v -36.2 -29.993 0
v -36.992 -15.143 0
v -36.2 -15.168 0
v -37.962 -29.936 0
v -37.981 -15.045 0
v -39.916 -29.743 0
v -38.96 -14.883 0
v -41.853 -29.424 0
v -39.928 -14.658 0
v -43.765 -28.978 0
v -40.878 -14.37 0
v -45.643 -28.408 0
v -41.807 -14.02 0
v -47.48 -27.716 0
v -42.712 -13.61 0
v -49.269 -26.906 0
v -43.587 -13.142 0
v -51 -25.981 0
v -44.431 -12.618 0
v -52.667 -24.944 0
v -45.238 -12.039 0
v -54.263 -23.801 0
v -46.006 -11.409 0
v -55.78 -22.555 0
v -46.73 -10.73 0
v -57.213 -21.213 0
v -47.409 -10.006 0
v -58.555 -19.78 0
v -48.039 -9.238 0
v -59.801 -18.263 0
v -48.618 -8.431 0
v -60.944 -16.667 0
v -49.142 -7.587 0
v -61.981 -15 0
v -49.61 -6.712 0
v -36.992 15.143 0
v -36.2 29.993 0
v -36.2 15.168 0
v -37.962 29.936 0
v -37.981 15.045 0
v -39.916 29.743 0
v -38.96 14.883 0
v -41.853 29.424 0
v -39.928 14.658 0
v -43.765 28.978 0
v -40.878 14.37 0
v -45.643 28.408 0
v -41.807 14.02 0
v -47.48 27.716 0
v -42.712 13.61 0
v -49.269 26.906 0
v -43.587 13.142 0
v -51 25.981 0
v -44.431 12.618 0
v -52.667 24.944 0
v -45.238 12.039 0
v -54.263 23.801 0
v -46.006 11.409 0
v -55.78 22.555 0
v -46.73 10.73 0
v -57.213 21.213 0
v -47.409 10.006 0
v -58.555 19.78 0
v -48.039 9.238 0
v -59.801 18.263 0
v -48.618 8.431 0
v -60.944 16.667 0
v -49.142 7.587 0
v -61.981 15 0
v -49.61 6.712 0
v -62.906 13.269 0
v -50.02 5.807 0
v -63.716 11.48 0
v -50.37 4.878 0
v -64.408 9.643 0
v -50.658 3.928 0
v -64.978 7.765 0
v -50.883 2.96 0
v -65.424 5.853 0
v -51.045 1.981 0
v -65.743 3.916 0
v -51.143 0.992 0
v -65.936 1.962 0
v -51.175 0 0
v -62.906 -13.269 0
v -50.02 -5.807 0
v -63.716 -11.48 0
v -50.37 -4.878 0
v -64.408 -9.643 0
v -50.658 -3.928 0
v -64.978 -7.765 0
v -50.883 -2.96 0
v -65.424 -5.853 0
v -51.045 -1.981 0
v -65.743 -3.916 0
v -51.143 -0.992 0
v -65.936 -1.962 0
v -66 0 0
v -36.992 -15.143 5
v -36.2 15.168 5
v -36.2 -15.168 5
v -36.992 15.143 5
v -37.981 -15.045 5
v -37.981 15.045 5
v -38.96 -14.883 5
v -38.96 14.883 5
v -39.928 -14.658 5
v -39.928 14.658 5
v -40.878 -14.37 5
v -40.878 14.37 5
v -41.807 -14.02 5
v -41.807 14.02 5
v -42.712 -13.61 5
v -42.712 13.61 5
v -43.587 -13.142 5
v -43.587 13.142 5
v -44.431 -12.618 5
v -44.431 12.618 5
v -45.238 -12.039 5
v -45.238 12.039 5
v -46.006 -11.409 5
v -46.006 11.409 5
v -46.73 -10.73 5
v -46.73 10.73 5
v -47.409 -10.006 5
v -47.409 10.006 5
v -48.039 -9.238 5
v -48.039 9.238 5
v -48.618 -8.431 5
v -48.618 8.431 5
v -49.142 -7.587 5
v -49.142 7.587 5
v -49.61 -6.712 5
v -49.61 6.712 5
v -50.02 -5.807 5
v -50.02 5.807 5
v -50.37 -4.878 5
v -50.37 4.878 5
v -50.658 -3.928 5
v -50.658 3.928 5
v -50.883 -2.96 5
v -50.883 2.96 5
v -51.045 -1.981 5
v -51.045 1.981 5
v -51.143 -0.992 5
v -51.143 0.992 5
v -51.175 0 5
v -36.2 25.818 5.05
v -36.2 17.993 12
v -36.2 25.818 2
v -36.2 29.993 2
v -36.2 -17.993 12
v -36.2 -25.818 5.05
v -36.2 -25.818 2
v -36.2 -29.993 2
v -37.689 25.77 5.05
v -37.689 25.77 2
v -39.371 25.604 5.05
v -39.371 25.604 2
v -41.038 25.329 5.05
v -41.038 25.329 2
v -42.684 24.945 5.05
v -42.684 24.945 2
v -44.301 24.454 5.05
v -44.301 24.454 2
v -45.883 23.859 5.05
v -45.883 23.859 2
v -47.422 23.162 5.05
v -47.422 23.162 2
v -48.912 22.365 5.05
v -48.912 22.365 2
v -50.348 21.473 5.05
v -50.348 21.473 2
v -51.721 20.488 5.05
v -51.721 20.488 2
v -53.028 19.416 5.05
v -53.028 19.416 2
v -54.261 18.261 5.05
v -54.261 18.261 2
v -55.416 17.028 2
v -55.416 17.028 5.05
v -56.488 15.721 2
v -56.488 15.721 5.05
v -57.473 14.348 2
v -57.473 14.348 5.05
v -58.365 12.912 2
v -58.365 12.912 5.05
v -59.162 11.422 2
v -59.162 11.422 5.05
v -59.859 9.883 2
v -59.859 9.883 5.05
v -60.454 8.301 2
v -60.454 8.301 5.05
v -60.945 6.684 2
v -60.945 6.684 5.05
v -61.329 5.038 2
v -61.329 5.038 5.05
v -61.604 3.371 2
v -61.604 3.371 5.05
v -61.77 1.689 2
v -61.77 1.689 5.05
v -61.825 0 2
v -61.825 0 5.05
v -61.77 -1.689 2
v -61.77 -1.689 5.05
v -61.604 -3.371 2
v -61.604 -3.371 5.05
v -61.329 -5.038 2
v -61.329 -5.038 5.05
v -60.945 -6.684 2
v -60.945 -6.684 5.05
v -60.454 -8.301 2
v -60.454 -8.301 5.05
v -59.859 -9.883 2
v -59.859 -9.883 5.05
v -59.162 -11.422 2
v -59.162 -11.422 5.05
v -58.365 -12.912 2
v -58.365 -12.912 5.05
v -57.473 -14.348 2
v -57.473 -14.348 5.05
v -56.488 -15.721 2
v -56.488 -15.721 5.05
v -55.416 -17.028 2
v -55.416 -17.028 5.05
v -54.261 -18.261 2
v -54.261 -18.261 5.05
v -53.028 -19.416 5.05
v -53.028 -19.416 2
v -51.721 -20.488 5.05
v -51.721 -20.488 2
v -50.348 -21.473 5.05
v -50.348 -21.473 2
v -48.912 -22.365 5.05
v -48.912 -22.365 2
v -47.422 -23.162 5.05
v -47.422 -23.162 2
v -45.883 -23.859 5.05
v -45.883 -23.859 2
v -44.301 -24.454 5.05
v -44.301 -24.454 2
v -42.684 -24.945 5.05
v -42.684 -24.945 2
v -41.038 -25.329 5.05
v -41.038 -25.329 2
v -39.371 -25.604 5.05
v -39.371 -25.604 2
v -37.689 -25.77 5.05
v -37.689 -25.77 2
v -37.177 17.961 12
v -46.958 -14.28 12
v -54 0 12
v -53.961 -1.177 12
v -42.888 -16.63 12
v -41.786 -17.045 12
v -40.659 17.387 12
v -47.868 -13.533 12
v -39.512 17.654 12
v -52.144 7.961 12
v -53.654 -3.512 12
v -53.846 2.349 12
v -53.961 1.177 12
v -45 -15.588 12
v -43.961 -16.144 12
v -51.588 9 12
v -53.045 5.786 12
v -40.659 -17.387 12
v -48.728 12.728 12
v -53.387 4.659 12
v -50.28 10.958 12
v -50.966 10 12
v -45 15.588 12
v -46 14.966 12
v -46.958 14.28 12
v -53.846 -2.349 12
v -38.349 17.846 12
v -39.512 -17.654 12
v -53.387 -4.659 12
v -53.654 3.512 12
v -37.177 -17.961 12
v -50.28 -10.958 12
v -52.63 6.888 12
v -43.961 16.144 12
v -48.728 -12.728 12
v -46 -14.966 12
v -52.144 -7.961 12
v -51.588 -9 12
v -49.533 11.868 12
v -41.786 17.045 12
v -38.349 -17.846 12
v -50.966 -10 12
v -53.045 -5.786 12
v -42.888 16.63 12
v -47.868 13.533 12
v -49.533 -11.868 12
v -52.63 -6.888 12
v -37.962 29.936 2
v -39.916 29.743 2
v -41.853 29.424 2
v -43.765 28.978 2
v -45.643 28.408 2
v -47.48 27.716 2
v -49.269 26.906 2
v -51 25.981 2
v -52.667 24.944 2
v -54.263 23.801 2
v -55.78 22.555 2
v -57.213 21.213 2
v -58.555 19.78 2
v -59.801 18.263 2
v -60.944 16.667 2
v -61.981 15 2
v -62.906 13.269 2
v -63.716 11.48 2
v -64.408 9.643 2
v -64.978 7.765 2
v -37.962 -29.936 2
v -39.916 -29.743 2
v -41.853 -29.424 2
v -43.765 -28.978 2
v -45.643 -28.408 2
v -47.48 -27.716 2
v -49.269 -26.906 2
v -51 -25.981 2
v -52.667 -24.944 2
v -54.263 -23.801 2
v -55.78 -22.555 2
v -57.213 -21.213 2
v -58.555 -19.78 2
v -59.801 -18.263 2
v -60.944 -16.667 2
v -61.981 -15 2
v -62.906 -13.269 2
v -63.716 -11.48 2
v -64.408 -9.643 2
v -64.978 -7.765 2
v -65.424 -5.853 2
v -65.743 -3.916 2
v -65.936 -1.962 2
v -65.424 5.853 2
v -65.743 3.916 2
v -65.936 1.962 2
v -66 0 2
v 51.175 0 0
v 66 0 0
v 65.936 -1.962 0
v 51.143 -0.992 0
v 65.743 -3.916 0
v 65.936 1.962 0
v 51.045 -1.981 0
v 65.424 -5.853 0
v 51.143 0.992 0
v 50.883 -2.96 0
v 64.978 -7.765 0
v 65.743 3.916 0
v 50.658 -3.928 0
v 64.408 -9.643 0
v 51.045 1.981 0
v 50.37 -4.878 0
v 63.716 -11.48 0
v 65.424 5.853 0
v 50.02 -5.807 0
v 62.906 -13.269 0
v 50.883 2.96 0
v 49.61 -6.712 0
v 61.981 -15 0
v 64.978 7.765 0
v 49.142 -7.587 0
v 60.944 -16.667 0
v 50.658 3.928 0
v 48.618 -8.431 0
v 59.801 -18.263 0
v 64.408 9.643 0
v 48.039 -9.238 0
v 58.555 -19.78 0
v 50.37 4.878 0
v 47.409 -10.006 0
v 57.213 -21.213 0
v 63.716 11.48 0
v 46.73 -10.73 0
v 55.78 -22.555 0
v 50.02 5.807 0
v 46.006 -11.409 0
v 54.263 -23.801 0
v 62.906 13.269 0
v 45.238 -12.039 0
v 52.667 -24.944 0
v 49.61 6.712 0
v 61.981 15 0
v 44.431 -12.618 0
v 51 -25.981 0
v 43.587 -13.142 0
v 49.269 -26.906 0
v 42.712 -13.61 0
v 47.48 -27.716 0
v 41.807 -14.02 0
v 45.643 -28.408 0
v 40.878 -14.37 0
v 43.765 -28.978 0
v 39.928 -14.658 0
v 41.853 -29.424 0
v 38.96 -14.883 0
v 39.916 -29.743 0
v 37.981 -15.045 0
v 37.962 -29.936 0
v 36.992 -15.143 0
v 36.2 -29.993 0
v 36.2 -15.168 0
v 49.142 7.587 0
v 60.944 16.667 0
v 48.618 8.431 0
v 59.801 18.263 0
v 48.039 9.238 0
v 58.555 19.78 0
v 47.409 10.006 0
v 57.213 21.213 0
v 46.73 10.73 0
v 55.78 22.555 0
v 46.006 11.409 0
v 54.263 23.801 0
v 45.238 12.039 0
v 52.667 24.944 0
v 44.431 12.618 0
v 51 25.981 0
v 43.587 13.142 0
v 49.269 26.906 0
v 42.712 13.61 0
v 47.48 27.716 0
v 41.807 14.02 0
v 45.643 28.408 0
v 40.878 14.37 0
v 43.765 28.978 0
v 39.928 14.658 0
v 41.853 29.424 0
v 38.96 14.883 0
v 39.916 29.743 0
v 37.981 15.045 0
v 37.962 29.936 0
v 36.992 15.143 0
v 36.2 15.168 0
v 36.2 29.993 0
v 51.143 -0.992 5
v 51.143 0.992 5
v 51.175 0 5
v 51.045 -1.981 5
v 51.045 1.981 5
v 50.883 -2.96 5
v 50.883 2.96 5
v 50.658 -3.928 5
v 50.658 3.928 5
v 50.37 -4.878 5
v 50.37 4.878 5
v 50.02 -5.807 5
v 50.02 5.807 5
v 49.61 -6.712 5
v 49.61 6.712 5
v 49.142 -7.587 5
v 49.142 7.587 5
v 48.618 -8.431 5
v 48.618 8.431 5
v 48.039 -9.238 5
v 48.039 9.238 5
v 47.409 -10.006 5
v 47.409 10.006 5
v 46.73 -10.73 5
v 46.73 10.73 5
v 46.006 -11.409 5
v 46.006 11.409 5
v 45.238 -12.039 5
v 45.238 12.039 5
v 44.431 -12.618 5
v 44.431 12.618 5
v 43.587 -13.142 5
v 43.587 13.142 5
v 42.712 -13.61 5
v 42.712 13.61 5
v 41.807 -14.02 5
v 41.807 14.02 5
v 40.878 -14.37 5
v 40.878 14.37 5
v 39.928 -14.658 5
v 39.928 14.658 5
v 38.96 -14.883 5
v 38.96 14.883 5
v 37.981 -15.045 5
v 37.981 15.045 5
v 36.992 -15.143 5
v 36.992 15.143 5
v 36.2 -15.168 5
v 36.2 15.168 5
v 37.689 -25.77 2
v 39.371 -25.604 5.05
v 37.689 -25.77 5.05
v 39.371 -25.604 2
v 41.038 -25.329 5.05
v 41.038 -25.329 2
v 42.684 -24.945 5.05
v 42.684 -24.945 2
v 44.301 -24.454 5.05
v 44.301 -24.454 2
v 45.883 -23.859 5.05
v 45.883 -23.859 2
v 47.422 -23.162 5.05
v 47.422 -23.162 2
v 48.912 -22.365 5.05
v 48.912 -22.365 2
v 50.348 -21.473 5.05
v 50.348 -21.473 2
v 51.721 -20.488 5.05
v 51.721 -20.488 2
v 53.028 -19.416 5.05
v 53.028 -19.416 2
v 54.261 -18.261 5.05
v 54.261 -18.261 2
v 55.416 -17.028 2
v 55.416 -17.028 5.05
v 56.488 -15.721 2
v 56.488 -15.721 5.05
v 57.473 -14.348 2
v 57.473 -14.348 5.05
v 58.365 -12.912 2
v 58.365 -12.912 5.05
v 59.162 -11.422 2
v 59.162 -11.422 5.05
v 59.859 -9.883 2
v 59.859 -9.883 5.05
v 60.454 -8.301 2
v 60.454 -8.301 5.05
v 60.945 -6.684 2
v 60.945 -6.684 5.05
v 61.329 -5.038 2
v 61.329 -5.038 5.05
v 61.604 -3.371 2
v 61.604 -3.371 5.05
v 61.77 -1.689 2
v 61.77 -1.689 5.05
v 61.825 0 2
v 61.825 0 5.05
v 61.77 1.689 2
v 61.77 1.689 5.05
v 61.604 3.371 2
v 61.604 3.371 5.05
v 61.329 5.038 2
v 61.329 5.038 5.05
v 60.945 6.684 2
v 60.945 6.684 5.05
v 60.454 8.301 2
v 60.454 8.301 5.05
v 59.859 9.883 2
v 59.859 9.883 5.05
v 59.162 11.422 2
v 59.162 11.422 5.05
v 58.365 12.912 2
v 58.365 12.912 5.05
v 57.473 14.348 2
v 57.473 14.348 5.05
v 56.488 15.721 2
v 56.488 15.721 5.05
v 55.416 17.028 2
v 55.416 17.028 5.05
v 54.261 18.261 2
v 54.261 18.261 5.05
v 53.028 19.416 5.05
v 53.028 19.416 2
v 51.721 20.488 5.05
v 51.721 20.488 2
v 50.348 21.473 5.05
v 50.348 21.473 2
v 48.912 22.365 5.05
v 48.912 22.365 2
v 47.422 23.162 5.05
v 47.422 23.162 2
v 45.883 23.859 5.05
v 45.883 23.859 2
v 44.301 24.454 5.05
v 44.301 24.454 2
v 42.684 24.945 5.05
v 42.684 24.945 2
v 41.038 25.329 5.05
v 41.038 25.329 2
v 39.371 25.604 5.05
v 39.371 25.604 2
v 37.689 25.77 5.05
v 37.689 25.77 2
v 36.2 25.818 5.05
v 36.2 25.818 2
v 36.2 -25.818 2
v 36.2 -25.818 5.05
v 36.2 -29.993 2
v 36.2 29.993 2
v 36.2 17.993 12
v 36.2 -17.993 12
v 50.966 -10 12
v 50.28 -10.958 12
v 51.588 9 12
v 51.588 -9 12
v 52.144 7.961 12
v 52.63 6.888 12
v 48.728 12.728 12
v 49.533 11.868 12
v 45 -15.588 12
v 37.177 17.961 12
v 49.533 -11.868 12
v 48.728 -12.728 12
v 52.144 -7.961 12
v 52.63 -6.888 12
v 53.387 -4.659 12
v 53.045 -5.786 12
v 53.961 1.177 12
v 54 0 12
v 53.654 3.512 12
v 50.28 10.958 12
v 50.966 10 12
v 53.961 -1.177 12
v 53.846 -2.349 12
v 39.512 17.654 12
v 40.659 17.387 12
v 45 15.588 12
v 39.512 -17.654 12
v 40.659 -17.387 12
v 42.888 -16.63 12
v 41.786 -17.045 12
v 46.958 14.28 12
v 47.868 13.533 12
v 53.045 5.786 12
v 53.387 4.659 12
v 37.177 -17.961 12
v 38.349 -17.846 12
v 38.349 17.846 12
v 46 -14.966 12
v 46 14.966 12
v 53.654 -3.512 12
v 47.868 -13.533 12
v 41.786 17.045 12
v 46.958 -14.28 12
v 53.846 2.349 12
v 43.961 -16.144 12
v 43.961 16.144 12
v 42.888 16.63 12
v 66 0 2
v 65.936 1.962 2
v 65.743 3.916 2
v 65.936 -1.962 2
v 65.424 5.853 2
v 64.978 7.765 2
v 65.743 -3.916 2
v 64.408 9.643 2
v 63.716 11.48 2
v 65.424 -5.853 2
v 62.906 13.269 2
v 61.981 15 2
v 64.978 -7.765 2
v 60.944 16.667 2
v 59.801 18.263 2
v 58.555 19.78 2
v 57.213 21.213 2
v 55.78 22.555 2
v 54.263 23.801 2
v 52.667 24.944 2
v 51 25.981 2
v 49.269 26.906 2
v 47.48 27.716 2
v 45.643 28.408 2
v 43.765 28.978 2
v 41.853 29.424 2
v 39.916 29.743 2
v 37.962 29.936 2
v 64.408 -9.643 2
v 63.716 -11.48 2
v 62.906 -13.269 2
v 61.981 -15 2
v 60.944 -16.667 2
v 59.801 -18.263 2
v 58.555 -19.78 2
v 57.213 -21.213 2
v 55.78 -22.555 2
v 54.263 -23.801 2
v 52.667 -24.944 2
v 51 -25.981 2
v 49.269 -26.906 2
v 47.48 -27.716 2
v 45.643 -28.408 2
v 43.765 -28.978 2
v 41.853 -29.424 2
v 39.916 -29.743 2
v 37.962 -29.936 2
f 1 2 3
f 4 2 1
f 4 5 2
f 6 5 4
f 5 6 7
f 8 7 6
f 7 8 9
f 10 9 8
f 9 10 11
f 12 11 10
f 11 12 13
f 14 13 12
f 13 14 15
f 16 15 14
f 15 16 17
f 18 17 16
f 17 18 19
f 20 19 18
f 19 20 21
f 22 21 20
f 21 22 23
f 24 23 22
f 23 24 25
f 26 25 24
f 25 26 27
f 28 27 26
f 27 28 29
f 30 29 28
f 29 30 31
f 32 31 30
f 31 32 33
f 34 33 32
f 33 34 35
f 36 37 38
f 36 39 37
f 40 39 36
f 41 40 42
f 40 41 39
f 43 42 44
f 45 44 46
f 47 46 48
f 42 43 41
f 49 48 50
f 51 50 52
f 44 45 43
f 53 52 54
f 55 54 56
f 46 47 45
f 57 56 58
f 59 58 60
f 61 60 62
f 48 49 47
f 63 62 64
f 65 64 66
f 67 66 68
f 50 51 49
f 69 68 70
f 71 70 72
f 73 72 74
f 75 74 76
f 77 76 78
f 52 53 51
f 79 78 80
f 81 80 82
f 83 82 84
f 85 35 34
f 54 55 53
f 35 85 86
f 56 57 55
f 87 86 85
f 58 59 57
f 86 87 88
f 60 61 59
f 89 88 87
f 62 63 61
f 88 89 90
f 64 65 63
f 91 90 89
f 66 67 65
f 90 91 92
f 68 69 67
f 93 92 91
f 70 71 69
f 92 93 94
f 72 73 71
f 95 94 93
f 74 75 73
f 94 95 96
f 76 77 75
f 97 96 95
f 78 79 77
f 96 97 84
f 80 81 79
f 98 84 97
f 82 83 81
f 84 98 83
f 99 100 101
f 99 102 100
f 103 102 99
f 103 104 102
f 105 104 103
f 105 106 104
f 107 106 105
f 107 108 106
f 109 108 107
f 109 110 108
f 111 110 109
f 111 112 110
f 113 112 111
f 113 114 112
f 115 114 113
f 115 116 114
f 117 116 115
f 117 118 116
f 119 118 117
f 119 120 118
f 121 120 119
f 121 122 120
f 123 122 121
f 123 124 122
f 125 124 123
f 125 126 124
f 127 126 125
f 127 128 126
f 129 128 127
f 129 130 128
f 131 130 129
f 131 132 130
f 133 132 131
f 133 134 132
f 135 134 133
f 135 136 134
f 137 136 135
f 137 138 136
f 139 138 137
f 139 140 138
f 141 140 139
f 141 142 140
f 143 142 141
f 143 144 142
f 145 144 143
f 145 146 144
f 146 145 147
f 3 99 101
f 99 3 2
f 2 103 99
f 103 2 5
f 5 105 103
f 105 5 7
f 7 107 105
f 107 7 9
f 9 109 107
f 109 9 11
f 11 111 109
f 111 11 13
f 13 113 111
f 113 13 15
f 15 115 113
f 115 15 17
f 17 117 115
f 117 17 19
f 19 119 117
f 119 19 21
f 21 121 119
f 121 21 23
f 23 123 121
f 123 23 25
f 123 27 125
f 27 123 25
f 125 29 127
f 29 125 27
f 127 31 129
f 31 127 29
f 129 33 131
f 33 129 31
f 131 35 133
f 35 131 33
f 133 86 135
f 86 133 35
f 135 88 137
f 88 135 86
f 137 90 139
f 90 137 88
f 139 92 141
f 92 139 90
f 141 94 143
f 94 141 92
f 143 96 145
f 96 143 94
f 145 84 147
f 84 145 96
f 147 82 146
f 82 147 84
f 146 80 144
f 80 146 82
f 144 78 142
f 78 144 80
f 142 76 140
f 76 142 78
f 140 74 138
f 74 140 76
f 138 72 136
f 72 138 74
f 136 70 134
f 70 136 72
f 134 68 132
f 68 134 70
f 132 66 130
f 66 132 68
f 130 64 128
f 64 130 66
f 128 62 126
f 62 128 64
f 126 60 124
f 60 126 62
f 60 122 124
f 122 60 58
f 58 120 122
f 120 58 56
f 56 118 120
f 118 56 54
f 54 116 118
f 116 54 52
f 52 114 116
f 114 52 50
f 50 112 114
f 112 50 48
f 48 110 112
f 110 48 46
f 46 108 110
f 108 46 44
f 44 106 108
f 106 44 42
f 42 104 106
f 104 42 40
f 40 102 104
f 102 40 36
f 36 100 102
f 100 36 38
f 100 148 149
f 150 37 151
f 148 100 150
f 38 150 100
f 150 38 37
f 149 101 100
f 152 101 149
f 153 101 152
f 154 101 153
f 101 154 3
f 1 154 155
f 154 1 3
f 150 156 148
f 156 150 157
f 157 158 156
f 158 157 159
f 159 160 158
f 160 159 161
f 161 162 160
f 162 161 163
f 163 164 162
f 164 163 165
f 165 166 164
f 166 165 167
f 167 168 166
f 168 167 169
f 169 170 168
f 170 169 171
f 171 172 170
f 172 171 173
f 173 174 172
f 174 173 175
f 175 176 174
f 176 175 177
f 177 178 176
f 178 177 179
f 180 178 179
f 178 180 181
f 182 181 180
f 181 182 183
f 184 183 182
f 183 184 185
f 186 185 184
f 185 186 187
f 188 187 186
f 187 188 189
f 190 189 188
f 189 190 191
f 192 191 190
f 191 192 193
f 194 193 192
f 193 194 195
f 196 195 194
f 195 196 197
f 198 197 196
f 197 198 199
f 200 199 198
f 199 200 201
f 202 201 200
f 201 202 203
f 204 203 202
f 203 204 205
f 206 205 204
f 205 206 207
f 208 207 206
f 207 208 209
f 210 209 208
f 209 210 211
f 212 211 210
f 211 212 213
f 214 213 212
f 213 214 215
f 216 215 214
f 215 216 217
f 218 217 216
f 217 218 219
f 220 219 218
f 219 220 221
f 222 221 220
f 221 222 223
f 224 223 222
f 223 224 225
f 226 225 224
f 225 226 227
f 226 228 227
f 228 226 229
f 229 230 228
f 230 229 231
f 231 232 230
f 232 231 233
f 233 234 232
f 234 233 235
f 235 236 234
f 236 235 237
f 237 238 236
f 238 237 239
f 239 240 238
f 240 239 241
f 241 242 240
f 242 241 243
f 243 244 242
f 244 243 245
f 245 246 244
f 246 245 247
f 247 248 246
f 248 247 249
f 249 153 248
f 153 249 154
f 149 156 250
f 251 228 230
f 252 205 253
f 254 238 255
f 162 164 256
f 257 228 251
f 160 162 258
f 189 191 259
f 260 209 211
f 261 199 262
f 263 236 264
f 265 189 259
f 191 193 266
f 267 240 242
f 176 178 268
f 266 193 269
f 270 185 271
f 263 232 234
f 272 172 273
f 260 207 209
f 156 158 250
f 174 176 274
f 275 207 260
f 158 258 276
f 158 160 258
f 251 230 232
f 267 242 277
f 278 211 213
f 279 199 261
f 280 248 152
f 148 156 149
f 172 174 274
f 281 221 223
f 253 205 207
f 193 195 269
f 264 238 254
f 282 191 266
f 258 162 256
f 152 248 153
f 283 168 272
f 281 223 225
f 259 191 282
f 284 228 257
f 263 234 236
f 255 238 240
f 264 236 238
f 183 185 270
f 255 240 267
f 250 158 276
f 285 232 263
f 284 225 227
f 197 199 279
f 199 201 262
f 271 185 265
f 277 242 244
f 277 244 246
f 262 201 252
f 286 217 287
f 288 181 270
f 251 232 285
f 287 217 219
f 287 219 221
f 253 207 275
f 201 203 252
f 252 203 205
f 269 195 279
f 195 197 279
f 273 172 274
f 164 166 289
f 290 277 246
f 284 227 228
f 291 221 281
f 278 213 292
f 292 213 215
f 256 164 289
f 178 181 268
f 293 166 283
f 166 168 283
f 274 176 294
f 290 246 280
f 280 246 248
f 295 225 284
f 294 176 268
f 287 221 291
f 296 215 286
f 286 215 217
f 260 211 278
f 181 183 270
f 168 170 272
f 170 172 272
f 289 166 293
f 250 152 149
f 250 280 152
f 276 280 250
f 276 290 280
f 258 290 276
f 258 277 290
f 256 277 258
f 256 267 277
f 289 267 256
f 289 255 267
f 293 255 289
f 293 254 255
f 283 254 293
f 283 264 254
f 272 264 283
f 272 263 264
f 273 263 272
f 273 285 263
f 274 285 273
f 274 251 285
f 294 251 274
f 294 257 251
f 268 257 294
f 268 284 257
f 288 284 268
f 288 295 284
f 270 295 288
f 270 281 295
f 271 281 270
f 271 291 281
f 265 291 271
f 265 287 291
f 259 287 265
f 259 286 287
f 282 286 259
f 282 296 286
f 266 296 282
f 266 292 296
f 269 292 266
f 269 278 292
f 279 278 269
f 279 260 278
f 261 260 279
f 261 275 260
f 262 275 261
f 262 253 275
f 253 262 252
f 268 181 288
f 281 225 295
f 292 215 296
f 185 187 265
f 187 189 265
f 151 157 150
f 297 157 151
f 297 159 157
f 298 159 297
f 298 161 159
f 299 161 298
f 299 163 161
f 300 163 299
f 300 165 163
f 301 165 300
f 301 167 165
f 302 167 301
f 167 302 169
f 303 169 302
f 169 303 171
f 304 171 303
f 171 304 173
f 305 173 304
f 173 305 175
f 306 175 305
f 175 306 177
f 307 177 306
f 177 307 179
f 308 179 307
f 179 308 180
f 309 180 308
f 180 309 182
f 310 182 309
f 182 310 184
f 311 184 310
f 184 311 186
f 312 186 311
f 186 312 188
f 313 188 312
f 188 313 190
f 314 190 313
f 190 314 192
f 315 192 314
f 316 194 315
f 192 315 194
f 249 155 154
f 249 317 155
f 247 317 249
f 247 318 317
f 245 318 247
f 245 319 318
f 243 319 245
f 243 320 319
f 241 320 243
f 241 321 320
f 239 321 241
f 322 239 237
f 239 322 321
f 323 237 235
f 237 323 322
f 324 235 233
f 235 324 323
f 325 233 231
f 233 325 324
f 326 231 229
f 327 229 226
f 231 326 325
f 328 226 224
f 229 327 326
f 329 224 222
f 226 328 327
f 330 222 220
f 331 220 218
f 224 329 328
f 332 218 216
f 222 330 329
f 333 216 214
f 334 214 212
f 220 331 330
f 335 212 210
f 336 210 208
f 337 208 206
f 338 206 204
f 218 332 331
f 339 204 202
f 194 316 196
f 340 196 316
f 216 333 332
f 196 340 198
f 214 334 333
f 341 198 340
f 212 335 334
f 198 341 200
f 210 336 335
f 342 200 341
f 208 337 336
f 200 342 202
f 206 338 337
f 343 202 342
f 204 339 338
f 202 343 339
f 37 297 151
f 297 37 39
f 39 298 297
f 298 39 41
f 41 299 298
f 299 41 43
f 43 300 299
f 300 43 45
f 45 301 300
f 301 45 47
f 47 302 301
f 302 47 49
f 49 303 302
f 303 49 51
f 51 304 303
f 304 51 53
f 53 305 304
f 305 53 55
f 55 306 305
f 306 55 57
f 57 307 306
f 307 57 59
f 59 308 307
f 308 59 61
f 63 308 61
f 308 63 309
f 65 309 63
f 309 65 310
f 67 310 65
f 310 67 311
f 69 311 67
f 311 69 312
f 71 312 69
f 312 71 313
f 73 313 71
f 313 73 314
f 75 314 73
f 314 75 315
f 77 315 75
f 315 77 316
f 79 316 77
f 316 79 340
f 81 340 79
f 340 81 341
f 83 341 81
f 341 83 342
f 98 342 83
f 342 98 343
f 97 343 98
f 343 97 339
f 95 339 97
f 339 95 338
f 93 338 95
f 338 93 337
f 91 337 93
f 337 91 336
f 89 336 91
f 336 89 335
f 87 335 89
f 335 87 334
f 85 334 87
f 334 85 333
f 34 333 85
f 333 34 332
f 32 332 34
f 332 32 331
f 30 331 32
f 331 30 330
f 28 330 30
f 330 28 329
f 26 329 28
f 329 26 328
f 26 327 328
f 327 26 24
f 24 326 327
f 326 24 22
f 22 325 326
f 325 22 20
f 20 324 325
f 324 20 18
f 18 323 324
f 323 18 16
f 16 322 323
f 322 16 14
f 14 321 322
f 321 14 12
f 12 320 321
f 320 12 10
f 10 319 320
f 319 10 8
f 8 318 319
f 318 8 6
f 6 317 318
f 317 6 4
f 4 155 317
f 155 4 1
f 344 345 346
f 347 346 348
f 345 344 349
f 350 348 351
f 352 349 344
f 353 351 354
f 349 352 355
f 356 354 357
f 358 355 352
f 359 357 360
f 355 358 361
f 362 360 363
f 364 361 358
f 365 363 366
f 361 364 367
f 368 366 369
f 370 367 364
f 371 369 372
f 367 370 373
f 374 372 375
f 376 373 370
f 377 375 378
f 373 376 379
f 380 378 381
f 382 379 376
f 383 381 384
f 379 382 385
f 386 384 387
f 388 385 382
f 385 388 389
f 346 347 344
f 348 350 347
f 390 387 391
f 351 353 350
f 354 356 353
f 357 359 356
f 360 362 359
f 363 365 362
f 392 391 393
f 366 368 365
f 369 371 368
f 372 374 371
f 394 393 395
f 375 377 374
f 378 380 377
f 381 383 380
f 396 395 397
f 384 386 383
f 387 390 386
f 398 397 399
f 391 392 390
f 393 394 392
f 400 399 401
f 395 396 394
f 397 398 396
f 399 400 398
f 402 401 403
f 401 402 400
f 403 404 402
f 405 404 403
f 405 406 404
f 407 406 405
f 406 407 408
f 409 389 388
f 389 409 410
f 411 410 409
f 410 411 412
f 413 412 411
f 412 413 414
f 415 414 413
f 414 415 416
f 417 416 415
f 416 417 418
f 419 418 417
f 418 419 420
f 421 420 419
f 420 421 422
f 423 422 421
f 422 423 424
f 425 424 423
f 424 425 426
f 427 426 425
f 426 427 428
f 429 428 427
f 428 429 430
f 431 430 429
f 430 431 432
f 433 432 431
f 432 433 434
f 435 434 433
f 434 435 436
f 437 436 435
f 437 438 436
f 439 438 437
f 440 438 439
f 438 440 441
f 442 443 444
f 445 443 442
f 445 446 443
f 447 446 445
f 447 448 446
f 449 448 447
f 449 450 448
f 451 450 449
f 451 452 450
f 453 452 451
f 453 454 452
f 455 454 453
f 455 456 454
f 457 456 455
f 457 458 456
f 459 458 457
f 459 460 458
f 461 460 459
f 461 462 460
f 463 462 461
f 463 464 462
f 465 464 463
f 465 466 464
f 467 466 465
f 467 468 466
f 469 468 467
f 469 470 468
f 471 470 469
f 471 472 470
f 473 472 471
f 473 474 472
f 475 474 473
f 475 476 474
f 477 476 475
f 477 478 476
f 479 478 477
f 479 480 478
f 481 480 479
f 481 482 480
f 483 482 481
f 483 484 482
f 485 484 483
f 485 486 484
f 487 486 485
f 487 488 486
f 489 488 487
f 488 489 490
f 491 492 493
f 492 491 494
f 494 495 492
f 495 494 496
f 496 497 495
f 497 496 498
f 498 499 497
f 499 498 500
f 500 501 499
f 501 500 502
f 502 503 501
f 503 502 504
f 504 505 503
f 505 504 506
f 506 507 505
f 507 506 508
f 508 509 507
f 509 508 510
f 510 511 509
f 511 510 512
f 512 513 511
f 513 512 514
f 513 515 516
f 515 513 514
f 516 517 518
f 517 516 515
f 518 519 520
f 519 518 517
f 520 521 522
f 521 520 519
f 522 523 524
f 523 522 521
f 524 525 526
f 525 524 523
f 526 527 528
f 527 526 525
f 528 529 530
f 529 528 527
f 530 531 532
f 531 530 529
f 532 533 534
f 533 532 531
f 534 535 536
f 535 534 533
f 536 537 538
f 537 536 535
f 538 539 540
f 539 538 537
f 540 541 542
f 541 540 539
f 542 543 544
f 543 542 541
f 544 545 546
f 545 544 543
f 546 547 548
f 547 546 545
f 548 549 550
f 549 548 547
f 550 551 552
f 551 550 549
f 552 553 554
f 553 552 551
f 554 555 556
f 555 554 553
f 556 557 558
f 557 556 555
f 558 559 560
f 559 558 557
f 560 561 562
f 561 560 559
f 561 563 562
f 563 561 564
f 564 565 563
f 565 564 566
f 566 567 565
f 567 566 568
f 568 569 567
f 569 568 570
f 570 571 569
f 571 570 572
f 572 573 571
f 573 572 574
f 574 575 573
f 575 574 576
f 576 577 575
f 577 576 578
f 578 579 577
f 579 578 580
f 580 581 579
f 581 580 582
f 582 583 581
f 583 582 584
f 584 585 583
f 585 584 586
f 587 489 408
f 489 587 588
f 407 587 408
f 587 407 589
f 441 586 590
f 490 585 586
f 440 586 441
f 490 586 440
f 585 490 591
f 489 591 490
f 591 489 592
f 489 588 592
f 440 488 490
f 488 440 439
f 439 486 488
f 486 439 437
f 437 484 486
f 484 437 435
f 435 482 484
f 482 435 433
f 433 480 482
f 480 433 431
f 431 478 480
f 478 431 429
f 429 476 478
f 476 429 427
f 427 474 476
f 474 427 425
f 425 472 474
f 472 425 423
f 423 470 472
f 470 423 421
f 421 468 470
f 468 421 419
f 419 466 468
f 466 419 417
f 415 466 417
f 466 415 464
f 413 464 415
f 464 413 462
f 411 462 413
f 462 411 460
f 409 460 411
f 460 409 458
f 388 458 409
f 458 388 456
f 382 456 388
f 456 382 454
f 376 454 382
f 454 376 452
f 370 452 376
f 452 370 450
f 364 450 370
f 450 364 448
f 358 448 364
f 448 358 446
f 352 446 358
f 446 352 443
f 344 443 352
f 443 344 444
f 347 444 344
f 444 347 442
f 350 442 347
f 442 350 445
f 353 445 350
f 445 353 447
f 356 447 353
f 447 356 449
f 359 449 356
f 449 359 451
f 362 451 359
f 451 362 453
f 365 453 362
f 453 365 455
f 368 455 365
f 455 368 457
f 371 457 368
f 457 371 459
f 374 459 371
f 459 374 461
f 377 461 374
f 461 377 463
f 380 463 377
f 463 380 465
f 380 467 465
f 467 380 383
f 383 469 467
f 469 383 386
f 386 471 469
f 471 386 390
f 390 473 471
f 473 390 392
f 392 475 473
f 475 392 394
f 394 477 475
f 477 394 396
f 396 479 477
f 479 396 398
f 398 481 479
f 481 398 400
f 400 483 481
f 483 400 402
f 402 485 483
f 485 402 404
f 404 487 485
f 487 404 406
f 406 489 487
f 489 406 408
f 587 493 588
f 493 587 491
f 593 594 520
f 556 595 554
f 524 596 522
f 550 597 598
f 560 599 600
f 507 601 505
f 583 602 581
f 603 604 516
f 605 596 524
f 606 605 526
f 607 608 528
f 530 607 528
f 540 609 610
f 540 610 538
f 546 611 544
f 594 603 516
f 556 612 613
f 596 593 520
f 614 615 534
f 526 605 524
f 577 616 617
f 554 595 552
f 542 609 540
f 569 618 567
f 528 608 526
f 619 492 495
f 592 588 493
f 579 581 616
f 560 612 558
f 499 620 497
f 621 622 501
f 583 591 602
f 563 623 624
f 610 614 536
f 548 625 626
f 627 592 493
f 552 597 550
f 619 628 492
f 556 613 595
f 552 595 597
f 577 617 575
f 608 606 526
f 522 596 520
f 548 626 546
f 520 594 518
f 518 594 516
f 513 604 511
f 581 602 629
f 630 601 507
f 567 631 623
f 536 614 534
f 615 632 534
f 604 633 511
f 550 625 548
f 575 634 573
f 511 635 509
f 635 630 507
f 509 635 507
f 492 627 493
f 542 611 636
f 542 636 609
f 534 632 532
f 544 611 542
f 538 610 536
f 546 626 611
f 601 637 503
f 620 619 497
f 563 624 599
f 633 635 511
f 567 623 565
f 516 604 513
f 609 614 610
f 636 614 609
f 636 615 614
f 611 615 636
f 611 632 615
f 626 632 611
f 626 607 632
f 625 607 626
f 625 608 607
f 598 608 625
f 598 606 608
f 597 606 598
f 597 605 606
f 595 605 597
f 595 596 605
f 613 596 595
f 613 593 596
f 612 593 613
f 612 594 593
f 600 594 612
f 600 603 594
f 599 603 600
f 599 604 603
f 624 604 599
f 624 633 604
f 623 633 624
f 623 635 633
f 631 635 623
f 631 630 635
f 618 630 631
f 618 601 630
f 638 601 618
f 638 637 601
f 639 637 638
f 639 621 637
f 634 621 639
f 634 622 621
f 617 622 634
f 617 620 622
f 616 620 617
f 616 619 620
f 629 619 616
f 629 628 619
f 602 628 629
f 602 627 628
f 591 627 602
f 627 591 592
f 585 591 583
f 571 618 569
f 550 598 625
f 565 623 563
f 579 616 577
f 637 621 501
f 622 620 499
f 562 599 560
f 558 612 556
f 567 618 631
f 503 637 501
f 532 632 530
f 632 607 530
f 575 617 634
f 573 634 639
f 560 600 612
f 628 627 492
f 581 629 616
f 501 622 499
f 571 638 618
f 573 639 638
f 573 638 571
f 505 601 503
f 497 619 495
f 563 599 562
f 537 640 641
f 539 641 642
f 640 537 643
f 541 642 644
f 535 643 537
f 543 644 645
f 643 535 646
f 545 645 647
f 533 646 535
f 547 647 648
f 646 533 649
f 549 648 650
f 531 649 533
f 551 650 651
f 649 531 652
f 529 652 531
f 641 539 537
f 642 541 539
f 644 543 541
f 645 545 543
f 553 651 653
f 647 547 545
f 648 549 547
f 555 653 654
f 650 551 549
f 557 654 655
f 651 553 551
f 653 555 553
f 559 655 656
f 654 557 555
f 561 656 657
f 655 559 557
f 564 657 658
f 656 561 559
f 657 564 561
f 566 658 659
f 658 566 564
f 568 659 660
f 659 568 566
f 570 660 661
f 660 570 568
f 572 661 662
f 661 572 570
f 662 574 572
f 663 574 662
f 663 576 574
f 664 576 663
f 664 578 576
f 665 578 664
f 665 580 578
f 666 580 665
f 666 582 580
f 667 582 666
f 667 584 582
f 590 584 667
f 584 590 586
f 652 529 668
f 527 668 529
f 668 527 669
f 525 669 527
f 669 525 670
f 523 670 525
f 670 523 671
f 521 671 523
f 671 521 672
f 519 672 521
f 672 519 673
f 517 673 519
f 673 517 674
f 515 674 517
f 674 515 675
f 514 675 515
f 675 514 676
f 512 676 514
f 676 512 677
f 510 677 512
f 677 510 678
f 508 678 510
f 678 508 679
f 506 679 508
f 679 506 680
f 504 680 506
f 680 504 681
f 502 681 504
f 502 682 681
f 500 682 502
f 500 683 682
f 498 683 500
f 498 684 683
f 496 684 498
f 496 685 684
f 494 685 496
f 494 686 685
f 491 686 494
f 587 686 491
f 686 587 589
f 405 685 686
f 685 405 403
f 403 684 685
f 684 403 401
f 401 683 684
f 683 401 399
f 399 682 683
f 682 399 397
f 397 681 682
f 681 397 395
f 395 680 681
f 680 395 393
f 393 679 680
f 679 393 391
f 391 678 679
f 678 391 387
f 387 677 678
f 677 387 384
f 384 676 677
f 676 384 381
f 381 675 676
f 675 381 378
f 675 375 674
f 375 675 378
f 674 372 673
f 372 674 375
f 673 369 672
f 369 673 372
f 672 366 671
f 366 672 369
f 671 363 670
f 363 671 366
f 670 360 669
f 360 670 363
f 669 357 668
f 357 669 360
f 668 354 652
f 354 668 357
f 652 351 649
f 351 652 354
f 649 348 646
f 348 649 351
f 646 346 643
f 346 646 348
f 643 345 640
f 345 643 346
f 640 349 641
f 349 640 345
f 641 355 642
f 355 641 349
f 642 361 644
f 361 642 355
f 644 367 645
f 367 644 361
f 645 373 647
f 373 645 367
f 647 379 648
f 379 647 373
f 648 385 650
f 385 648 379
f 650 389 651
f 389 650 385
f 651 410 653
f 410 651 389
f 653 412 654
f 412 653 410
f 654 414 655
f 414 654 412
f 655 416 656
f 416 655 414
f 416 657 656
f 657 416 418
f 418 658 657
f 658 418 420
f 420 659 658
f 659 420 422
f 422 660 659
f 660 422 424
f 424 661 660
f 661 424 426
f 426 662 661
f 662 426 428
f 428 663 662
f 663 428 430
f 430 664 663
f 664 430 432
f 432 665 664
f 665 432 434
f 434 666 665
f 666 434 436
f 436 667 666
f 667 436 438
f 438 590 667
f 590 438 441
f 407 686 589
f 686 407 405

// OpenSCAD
// Parametric two-piece filament spool adapter V1.
// Dimensions are in millimeters.
//
// V1 default values match the existing CR-6 STL intent:
// - 30 mm printer shaft
// - 52 mm spool bore
// - 60 mm keeper/flange supported against the spool side
//
// Render both printable halves side-by-side, then put the halves together
// around the shaft to adapt the shaft diameter up to the spool bore.

$fn = 96;

shaft_diameter = 30;
spool_bore_diameter = 52;
keeper_outer_diameter = 60;

adapter_width = 12;        // Total axial width of each half.
keeper_width = 2;          // Axial thickness of the side keeper/flange.
spool_seat_width = 5;      // Straight section that seats in the spool bore.
taper_end_diameter = 36;   // Outside diameter at the shaft-side end of taper.
clearance = 0.35;          // Added to the shaft bore and removed from the spool fit.
split_gap = 0.4;           // Clearance between the two assembled half faces.
print_gap = 12;            // Gap between the two halves in the rendered layout.

// Small flat pads at the split line help the halves sit cleanly together and
// make the geometry more robust when printed.
split_flat_width = 1.2;

module half_annulus_2d(outer_diameter, inner_diameter, side = 1) {
    radius = outer_diameter / 2;

    difference() {
        intersection() {
            circle(d = outer_diameter);

            // Keep only one side of the circular adapter.  The extra overlap
            // avoids coincident edges at the split line.
            translate([
                side > 0 ? split_gap / 2 : -radius - 1,
                -radius - 1
            ])
                square([radius + 1 - split_gap / 2, outer_diameter + 2]);
        }

        circle(d = inner_diameter);

        // Trim a narrow strip from the split face so the two halves do not bind
        // when they are clamped around the shaft.
        translate([
            side > 0 ? -split_flat_width : -split_gap / 2,
            -radius - 1
        ])
            square([split_flat_width + split_gap / 2, outer_diameter + 2]);
    }
}

module tapered_half_annulus(
    start_outer_diameter,
    end_outer_diameter,
    inner_diameter,
    height,
    side = 1
) {
    // Hull two very thin half-annulus slices to create a conical taper.  The
    // bore stays constant for the shaft while the outside shrinks from the
    // spool seat toward the smaller shaft-side end.
    slice_height = 0.05;

    if (height > 0) {
        hull() {
            linear_extrude(height = slice_height)
                half_annulus_2d(start_outer_diameter, inner_diameter, side);

            translate([0, 0, height - slice_height])
                linear_extrude(height = slice_height)
                    half_annulus_2d(end_outer_diameter, inner_diameter, side);
        }
    }
}

module adapter_half(side = 1) {
    shaft_bore = shaft_diameter + clearance;
    spool_fit = spool_bore_diameter - clearance;
    taper_end = max(taper_end_diameter, shaft_bore + 2);
    seat_width = min(spool_seat_width, adapter_width);
    taper_width = adapter_width - seat_width;

    union() {
        // Straight spool seat at the keeper side.
        linear_extrude(height = seat_width)
            half_annulus_2d(spool_fit, shaft_bore, side);

        // Taper from the spool seat back toward the smaller shaft-side end.
        translate([0, 0, seat_width])
            tapered_half_annulus(
                spool_fit,
                taper_end,
                shaft_bore,
                taper_width,
                side
            );

        // Larger side keeper/flange.  This is intentionally only on one side
        // so it bears on the side of the spool instead of widening the whole
        // adapter.
        linear_extrude(height = keeper_width)
            half_annulus_2d(keeper_outer_diameter, shaft_bore, side);
    }
}

module printable_pair() {
    part_offset = keeper_outer_diameter / 2 + print_gap / 2;

    translate([-part_offset, 0, 0])
        adapter_half(side = -1);

    translate([part_offset, 0, 0])
        adapter_half(side = 1);
}

printable_pair();
